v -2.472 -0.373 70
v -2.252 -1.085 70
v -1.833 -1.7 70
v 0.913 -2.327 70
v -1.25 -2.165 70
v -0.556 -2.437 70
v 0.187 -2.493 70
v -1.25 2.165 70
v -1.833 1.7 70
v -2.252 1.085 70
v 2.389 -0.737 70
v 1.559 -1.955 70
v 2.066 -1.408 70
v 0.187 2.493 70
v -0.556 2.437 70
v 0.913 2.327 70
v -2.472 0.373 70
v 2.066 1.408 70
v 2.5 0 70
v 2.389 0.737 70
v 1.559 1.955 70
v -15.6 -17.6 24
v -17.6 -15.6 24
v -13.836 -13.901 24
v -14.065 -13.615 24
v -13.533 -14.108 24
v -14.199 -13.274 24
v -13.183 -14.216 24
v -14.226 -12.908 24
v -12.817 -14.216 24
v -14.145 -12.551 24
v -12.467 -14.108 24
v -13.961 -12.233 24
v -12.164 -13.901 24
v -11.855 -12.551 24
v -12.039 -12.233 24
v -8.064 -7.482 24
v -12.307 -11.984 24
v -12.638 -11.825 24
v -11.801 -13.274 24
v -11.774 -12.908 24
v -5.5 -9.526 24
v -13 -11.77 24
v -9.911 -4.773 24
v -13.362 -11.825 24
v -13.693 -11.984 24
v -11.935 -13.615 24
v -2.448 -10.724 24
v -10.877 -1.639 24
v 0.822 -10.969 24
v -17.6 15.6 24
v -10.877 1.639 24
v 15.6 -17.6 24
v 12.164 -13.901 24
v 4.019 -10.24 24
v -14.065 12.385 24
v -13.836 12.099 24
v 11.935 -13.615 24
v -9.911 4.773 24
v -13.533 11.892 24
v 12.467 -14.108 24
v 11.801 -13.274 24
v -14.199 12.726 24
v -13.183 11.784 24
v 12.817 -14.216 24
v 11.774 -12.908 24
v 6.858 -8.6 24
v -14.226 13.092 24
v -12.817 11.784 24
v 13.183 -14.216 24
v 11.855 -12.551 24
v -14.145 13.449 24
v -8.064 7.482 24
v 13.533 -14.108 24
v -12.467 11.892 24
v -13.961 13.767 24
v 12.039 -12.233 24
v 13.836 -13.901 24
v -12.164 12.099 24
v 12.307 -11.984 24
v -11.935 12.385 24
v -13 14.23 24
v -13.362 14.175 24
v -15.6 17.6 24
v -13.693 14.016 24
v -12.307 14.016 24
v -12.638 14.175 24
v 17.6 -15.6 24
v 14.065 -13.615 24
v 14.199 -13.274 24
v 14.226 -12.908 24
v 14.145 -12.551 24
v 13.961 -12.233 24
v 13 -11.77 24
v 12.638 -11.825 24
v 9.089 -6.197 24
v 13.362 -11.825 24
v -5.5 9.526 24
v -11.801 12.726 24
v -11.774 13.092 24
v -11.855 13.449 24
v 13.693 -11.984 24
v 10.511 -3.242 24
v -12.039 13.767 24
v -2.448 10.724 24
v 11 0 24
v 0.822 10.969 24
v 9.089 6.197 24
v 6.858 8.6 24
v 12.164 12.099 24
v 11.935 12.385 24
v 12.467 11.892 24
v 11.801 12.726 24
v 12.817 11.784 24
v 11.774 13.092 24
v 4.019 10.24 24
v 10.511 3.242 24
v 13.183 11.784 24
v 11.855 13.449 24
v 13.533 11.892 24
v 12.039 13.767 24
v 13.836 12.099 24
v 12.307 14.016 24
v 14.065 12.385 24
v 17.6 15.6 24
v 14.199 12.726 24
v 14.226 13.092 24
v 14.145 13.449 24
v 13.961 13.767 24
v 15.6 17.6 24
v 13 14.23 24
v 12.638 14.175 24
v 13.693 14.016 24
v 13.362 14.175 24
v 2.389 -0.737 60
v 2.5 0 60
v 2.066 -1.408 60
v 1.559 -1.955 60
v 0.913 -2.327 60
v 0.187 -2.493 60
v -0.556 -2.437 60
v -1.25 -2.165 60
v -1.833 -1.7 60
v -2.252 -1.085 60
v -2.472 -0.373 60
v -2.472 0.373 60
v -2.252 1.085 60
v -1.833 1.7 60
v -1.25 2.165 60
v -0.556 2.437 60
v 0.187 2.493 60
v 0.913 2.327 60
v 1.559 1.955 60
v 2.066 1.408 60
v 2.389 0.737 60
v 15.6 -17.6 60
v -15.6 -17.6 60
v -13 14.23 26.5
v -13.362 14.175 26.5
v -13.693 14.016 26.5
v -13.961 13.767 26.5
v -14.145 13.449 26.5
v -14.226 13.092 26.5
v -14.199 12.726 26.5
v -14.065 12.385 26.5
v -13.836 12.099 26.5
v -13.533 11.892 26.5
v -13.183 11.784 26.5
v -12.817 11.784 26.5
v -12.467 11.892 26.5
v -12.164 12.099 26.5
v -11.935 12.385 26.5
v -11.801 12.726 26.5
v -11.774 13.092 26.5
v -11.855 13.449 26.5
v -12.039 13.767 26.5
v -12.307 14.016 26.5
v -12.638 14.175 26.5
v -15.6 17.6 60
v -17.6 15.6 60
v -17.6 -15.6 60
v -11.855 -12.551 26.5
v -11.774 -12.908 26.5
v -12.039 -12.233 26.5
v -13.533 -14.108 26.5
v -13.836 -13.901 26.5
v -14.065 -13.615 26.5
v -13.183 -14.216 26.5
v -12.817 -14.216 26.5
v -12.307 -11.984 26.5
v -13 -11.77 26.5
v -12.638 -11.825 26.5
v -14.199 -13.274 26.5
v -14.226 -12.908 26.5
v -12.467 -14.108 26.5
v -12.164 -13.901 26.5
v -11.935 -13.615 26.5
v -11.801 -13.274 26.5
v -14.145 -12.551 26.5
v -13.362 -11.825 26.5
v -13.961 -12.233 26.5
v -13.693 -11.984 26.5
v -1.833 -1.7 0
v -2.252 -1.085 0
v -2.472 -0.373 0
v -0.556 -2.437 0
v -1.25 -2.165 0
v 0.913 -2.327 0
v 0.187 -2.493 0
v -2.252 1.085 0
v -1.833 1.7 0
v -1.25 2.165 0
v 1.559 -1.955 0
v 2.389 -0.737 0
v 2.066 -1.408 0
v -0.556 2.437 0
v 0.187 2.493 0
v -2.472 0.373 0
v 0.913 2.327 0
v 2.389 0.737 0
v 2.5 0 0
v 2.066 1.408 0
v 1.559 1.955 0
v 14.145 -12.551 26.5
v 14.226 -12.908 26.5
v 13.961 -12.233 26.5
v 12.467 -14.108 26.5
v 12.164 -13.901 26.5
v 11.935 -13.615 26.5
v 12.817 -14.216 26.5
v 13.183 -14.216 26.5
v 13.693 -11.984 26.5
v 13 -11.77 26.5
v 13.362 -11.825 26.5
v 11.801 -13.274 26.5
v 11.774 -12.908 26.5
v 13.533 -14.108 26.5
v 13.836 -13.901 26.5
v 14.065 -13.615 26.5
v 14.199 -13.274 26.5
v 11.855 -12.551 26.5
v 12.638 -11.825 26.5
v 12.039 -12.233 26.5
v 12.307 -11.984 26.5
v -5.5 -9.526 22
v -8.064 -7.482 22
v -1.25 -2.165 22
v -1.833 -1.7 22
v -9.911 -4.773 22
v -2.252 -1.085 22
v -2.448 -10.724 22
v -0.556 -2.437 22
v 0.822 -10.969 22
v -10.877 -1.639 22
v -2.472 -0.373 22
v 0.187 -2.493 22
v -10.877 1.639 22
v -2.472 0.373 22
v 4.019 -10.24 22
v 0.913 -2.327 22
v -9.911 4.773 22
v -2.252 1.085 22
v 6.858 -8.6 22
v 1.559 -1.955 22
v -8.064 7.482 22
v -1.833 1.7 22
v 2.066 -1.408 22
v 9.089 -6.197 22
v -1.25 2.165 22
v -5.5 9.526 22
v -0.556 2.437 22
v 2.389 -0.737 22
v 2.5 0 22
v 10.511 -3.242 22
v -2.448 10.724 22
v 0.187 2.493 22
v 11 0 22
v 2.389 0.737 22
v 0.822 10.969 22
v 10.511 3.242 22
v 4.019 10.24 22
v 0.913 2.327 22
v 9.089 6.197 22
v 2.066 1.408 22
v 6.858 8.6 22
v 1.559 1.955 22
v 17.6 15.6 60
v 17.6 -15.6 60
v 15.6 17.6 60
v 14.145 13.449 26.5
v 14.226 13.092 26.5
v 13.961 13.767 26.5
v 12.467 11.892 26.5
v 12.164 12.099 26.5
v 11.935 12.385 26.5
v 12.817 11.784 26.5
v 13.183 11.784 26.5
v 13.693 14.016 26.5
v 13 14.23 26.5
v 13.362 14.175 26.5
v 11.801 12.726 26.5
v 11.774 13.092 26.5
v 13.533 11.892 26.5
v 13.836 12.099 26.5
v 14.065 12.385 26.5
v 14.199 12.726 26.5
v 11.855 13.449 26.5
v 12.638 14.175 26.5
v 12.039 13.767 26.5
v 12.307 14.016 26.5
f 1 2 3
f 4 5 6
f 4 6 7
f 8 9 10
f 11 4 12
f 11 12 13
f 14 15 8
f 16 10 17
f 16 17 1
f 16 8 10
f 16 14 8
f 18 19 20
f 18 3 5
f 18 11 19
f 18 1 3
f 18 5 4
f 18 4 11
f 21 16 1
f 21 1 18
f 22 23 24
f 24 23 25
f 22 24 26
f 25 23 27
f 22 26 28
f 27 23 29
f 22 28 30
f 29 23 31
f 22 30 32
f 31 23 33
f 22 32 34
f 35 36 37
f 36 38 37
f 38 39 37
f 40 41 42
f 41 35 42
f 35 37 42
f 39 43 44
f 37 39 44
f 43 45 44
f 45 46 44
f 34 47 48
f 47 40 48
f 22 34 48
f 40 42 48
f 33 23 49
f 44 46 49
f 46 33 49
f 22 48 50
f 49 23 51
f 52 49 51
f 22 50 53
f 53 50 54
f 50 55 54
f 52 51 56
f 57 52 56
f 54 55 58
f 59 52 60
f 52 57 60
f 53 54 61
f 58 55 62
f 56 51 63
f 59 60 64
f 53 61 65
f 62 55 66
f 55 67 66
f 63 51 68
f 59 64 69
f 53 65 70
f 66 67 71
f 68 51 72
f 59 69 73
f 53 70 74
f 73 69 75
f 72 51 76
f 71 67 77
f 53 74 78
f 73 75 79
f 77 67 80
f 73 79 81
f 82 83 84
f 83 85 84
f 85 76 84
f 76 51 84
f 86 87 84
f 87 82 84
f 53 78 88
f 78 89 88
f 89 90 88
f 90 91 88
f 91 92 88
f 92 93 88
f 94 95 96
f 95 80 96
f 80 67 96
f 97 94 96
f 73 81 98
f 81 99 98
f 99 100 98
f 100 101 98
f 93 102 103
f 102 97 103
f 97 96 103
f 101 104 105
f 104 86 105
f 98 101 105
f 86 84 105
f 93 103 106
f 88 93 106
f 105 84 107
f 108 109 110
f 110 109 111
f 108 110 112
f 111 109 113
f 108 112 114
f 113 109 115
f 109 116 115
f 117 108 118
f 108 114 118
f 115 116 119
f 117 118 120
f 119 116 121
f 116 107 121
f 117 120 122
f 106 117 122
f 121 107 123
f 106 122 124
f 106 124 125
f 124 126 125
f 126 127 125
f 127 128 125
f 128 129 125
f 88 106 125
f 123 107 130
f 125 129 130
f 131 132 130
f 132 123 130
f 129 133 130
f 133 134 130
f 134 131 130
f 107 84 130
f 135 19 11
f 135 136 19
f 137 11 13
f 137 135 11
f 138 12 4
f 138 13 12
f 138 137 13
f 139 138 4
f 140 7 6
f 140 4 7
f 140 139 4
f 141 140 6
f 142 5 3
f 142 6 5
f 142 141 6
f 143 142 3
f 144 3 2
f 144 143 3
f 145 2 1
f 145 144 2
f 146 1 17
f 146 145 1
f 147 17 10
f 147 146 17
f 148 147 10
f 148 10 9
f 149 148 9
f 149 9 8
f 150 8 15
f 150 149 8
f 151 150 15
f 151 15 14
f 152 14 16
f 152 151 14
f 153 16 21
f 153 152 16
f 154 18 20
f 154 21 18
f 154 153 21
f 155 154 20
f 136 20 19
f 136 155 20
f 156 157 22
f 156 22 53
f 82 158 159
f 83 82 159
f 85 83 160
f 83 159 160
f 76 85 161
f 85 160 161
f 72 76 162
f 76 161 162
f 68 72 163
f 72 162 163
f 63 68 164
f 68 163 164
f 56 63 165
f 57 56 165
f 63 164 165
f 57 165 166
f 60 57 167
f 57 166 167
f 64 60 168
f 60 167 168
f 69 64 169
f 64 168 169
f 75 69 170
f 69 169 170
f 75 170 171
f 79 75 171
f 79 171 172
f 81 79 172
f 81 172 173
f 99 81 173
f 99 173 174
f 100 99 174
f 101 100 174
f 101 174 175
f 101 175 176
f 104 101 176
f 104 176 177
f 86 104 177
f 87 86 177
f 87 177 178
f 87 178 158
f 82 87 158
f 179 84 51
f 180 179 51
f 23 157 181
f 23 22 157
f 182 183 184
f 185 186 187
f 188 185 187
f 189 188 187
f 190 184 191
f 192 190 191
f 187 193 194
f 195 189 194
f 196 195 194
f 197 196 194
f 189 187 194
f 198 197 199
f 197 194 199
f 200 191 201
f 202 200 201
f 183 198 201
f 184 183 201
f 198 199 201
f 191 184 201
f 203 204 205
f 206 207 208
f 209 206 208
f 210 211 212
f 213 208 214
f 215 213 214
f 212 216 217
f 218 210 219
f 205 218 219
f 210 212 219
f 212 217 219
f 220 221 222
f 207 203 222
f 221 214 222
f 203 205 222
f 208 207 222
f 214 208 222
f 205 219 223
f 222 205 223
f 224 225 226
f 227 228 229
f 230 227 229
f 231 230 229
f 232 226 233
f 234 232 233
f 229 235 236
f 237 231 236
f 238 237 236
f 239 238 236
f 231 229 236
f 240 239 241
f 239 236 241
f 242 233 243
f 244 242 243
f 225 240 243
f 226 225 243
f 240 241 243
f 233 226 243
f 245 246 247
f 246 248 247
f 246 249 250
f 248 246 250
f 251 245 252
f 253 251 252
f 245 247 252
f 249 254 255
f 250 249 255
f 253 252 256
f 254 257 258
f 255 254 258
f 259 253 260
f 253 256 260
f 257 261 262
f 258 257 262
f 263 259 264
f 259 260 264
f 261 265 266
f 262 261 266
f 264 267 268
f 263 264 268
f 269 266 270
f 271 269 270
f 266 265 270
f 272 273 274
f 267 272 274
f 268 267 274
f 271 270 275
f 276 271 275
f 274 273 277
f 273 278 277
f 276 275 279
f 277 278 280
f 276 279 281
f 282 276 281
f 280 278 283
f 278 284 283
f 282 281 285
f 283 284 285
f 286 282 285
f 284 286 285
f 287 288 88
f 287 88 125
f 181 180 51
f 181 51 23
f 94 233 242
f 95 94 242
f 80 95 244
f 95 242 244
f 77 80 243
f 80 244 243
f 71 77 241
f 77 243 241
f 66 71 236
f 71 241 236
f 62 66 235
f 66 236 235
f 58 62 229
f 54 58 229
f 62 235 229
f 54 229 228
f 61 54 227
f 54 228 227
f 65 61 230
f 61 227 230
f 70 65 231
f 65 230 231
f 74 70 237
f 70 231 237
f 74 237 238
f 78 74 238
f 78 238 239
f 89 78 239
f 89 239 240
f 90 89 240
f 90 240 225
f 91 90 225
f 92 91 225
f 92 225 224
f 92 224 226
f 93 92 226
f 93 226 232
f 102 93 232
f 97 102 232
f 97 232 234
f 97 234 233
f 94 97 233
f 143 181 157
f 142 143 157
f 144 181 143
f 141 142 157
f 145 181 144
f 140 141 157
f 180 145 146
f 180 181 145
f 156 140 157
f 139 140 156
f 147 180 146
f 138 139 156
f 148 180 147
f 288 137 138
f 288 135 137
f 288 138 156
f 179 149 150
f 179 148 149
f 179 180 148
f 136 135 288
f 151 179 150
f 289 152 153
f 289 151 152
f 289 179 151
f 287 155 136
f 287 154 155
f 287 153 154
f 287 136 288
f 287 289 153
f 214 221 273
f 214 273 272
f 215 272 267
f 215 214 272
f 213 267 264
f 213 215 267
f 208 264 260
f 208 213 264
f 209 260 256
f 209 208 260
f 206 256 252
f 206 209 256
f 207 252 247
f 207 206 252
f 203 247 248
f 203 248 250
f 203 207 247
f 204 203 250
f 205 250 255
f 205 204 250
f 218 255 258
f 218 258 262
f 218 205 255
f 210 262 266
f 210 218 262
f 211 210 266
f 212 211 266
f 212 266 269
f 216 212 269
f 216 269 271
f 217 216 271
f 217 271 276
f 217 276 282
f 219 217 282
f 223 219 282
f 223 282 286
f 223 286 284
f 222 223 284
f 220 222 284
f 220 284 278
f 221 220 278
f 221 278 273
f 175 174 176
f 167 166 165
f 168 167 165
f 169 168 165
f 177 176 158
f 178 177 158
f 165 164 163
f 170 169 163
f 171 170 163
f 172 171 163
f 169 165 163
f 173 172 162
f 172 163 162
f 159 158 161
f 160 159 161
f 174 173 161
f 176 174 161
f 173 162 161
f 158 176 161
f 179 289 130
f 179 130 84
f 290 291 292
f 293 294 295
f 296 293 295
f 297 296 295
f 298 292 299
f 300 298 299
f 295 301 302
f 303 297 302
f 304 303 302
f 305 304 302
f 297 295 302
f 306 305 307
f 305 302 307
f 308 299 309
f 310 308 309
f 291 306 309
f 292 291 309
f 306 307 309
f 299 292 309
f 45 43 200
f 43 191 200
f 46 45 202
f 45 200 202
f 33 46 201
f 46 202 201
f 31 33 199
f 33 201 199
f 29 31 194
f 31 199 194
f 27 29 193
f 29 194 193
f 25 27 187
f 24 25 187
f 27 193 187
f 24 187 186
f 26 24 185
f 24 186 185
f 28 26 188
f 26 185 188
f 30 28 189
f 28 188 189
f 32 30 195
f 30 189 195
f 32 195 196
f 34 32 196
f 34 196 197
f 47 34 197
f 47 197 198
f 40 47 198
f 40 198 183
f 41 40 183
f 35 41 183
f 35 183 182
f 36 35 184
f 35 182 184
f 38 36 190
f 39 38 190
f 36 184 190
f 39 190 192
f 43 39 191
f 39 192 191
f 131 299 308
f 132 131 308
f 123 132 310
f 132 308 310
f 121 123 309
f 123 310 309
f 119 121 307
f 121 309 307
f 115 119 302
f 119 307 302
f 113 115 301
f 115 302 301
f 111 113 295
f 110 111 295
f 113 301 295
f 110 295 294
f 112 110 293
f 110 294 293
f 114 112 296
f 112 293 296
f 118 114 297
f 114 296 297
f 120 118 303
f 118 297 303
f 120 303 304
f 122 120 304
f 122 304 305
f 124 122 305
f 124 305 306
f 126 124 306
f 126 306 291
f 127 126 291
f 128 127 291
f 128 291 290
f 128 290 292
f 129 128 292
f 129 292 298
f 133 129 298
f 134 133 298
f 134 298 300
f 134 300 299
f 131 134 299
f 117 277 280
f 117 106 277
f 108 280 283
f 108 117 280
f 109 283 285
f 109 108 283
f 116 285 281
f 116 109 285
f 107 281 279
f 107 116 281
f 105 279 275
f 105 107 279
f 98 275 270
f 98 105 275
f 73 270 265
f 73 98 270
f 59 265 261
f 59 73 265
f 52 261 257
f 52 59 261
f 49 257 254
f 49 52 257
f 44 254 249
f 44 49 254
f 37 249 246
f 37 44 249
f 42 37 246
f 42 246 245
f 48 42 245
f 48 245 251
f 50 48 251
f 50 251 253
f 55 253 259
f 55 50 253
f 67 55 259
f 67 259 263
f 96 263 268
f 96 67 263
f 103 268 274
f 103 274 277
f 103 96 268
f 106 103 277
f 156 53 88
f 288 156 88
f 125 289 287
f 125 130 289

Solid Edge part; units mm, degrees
sketch "Sketch1" plane through (0, 0, 0) normal (0, 0, 1) x (1, 0, 0)
  circle A0 centre (0, 0) radius 2.5
extrude "Protrusion1" add sketch "Sketch1" along normal blind 24
sketch "Sketch2" plane through (0, 0, 24) normal (0, 0, 1) x (1, 0, 0)
  circle A0 centre (0, 0) radius 11
extrude "ExtrudedProtrusion_2" add sketch "Sketch2" against normal blind 2
sketch "Sketch3" plane through (0, 0, 24) normal (0, 0, 1) x (1, 0, 0)
  line L0 (-15.6, -17.6) -> (15.6, -17.6)
  line L1 (15.6, -17.6) -> (17.6, -15.6)
  line L2 (17.6, -15.6) -> (17.6, 15.6)
  line L3 (15.6, 17.6) -> (17.6, 15.6)
  line L4 (15.6, 17.6) -> (-15.6, 17.6)
  line L5 (-15.6, 17.6) -> (-17.6, 15.6)
  line L6 (-17.6, 15.6) -> (-17.6, -15.6)
  line L7 (-15.6, -17.6) -> (-17.6, -15.6)
extrude "ExtrudedProtrusion_3" add sketch "Sketch3" along normal blind 36
hole "Hole_1" at (-13, -13, 24) direction (0, 0, 1) diameter 2.459 depth 2.5 thread major 3 thread length 2.5
hole "Hole1" at (-13, 13, 24) direction (0, 0, 1) diameter 2.459 depth 2.5 thread major 3 thread length 2.5
hole "Hole2" at (13, 13, 24) direction (0, 0, 1) diameter 2.459 depth 2.5 thread major 3 thread length 2.5
hole "Hole3" at (13, -13, 24) direction (0, 0, 1) diameter 2.459 depth 2.5 thread major 3 thread length 2.5
sketch "Sketch4" plane through (0, 0, 60) normal (0, 0, 1) x (1, 0, 0)
  circle A0 centre (0, 0) radius 2.5
extrude "ExtrudedProtrusion_4" add sketch "Sketch4" along normal blind 10
